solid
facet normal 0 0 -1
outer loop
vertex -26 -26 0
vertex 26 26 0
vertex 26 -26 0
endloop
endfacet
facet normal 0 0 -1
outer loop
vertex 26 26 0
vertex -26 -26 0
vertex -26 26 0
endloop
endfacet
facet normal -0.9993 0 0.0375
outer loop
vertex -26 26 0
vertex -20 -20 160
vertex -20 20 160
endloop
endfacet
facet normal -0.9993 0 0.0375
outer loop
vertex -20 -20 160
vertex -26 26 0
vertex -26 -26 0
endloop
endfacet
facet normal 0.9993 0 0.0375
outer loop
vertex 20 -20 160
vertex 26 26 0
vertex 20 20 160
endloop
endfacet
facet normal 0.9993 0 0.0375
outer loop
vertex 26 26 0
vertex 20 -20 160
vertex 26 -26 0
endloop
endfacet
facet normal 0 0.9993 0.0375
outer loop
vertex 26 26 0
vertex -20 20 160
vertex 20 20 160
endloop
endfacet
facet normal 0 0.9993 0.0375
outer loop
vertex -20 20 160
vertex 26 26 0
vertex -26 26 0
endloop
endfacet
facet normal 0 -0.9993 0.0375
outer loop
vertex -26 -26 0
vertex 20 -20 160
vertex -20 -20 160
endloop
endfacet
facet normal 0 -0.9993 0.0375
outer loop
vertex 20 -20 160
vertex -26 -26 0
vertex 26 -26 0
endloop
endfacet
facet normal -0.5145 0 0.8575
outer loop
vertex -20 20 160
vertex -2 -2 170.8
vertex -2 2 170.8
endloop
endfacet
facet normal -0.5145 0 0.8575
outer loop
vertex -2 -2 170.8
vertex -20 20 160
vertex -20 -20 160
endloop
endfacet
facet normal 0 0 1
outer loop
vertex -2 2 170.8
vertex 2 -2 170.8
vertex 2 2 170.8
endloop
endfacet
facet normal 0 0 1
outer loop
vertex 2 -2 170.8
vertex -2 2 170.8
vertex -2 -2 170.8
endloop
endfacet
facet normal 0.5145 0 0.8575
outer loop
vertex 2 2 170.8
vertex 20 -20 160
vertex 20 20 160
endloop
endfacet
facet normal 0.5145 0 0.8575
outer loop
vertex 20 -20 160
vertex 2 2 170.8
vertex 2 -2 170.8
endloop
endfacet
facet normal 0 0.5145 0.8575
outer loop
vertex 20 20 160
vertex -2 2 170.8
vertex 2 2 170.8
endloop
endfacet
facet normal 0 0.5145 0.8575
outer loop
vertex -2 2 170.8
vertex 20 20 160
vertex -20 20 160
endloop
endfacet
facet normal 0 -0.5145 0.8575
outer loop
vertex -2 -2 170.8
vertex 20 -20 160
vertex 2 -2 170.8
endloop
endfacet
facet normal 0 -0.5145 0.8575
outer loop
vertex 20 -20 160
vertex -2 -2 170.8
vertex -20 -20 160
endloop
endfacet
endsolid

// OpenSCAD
// file: tower.scad
// ======================================================
// Dice Tower (tapered shell) + DIAGONAL baffles (wall-to-wall)
// Baffles tilt across X (rotate about Y) and alternate each level
// ======================================================
$fn = 64;

// ---------- Tower geometry ----------
tower_h       = 160;   // body height (not counting cap)
outer_w_bot   = 52;    // outer width at base
outer_w_top   = 40;    // outer width at top
wall          = 3;     // wall thickness
cap_h         = 18;    // little pyramid cap

// Inner chute (constant rectangle, centered)
chute_w       = 32;    // X (give chunky d20s room)
chute_d       = 32;    // Y

// Exit opening (front = +Y)
base_clear_h  = 22;
exit_w        = 34;
exit_h        = 20;

// Funnel at top
funnel_h      = 20;
funnel_over   = 3;

// ---------- Baffles (DIAGONAL across X) ----------
num_baffles       = 6;
baffle_t          = 3.0;   // slightly thicker for robustness
baffle_angle_deg  = 15;     // slope across X (left high → right low, then flip)
baffle_margin     = 10;     // top/bottom margin before first/after last
y_clear_from_wall = 1.5;    // clearance from front/back walls (Y)
 x_overlap         = 1.0;    // small penetration into wall to avoid boolean slivers
baffle_max_width  = 18;     // max baffle width to prevent jamming

// ---------- helpers ----------
module taper(wb, wt, h){ linear_extrude(h, scale=wt/wb) square([wb,wb], center=true); }
function iw_bot() = outer_w_bot - 2*wall;
function iw_top() = outer_w_top - 2*wall;
function inner_w_at_z(z) = iw_bot() + (iw_top() - iw_bot()) * (z / tower_h);

// ---------- outer shell ----------
module outer_shell(){
  union(){
    taper(outer_w_bot, outer_w_top, tower_h);
    // Replace polyhedron cap with a short flat-ish cap to avoid fragile apex
    translate([0,0,tower_h])
      taper(outer_w_top, 4.0, cap_h*0.6); // small flat cap rather than a sharp point
  }
}

// ---------- subtractions ----------
module inner_cavity_taper(){ taper(iw_bot(), iw_top(), tower_h); }
module main_chute(){ linear_extrude(tower_h) square([chute_w, chute_d], center=true); }
module exit_window(){
  translate([0,0,base_clear_h + exit_h/2])
    rotate([90,0,0]) cube([exit_w, wall*2+0.2, exit_h], center=true);
}
module top_funnel(){
  fw_top = chute_w + 2*funnel_over;
  fw_bot = iw_top() - 2;
  fh     = min(funnel_h, tower_h*0.35);
  translate([0,0,tower_h - fh]) taper(fw_bot, fw_top, fh);
}

// ---------- DIAGONAL baffles (tilt across X, alternate) ----------
module baffles_diagonal(){
  usable_h = (tower_h - base_clear_h) - 2*baffle_margin;
  spacing  = usable_h / max(num_baffles,1);

  // size in Y (front/back) – centered with a small gap to both walls
  len_y = chute_d - 2*y_clear_from_wall;

  for(i=[0:num_baffles-1]){
    zc   = base_clear_h + baffle_margin + spacing*(i+0.5);
    iw_z = inner_w_at_z(zc);             // inner width between side walls at this Z

    // PROPER FIX: Baffles must attach to walls to be printable
    // Alternate between left-wall and right-wall attachment
    // Each baffle spans from one wall partway across, leaving flow gap on opposite side
    
    // Safety clamp: ensure flow gap is large enough for common D20s.
    // gap = chute_w - len_x  => enforce gap >= safe_d20 + clearance
    safe_d20   = 22.5;    // typical tip-to-tip diagonal for D20 (mm)
    clearance  = 0.5;     // extra wiggle room (mm)
  // maximum allowed baffle length so the remaining gap fits a D20
  max_len_allowed = max([0, chute_w - (safe_d20 + clearance)]);

  // clamp also by the local inner width at this Z to avoid overhanging into the tapered shell
  // leave a small margin so baffles don't butt exactly at the wall edge
  small_margin = 2.0;
  cap_by_inner = max([0, iw_z - small_margin]);

  // final baffle length: pick the desired coverage, clamp by D20, max width, and inner width;
  // ensure a tiny positive minimum so cube() never gets a zero size
  len_x = max([0.1, min([chute_w * 0.4, max_len_allowed, baffle_max_width, cap_by_inner])]);

    // Add a tiny positive overlap into the wall to avoid boolean slivers (use x_overlap if set)
    wall_penetration = max([0, x_overlap]);

    // compute x_offset so the baffle visibly attaches to the INNER wall at this Z
    inner_half = iw_z / 2;
    left_face  = -inner_half - wall_penetration; // a bit into the inner wall
    right_face =  inner_half + wall_penetration;
    x_offset = (i % 2 == 0) ?
      left_face + len_x/2 :   // Even: attach to LEFT inner wall
      right_face - len_x/2;   // Odd: attach to RIGHT inner wall

    // alternate slope across X: even -> left high/right low, odd -> reverse
    sign = (i % 2 == 0) ? 1 : -1;
    tilt = sign * baffle_angle_deg;

    // Single diagonal baffle - attached to alternating walls
    translate([x_offset, 0, zc])
      rotate([0, tilt, 0])
        cube([len_x, len_y, baffle_t], center=true);
  }
}

// ---------- assembly ----------
difference(){
  union(){
    outer_shell();
    // include internal shelves so they remain after subtraction
    baffles_diagonal();
  }
  inner_cavity_taper();
  main_chute();    // ensures a straight chute inside the tapered shell
  exit_window();
  top_funnel();
}

/* Tuning:
- Want a stronger slope?   baffle_angle_deg = 18–20
- Easier bridging?         baffle_t = 3.0
- More room for big dice?  chute_w = chute_d = 34
- Shelves touching side walls more obviously? increase x_overlap to 1.0
- If you prefer the “front/back hug” style instead, tell me and I’ll swap the
  tilt axis (rotate about X) and add the exact Y wall gap computation.
*/

// ---------- test slice helper ----------
// Renders a short vertical slice of the tower (0..slice_h mm) for test-printing
module test_slice(slice_h = 50){
  // render the final assembled tower, then clip with an intersection cube
  intersection(){
    // full model
    difference(){
      union(){ outer_shell(); baffles_diagonal(); }
      inner_cavity_taper();
      main_chute();
      exit_window();
      top_funnel();
    }
    // clipping box
    translate([-100,-100,0])
      cube([200,200,slice_h], center=false);
  }
}
// main file
use <tower.scad>

// Render only the outer shell + baffles to isolate mesh issues
union(){
  outer_shell();
  baffles_diagonal();
}
